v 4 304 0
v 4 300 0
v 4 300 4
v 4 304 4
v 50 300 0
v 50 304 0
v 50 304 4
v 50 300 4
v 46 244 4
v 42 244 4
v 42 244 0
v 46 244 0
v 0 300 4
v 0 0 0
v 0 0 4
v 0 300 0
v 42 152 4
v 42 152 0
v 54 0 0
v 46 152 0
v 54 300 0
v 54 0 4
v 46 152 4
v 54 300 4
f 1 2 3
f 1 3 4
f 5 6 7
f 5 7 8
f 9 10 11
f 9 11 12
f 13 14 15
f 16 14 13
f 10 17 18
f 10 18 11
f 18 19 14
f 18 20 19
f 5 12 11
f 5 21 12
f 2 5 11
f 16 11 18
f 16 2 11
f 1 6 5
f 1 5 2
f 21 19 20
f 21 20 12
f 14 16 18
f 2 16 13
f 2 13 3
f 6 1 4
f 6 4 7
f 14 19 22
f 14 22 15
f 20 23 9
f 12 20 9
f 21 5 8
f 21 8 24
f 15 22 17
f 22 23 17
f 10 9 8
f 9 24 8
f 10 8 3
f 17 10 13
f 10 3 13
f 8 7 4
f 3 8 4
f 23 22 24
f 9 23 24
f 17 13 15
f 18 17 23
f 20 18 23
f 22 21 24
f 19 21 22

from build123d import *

# Parameters (mm, degrees)
BOSS_EXTRUDE1_DEPTH = 4
SKETCH2_W           = 4
SKETCH2_H           = 92
CUT_EXTRUDE1_DEPTH  = 309.784714648


with BuildPart() as part:
    # Sketch1 → Boss-Extrude1 (new body)
    with BuildSketch(Plane.XY):
        Polygon((0, 300), (4, 300), (4, 304), (50, 304), (50, 300), (54, 300), (54, 0), (0, 0), align=None)
    extrude(amount=BOSS_EXTRUDE1_DEPTH)

    # Sketch2 → Cut-Extrude1 (cut, through all)
    with BuildSketch(Plane.XY.offset(4)):
        with Locations((44, 198)):
            Rectangle(SKETCH2_W, SKETCH2_H)
    extrude(amount=-CUT_EXTRUDE1_DEPTH, mode=Mode.SUBTRACT)


solid = part.part
